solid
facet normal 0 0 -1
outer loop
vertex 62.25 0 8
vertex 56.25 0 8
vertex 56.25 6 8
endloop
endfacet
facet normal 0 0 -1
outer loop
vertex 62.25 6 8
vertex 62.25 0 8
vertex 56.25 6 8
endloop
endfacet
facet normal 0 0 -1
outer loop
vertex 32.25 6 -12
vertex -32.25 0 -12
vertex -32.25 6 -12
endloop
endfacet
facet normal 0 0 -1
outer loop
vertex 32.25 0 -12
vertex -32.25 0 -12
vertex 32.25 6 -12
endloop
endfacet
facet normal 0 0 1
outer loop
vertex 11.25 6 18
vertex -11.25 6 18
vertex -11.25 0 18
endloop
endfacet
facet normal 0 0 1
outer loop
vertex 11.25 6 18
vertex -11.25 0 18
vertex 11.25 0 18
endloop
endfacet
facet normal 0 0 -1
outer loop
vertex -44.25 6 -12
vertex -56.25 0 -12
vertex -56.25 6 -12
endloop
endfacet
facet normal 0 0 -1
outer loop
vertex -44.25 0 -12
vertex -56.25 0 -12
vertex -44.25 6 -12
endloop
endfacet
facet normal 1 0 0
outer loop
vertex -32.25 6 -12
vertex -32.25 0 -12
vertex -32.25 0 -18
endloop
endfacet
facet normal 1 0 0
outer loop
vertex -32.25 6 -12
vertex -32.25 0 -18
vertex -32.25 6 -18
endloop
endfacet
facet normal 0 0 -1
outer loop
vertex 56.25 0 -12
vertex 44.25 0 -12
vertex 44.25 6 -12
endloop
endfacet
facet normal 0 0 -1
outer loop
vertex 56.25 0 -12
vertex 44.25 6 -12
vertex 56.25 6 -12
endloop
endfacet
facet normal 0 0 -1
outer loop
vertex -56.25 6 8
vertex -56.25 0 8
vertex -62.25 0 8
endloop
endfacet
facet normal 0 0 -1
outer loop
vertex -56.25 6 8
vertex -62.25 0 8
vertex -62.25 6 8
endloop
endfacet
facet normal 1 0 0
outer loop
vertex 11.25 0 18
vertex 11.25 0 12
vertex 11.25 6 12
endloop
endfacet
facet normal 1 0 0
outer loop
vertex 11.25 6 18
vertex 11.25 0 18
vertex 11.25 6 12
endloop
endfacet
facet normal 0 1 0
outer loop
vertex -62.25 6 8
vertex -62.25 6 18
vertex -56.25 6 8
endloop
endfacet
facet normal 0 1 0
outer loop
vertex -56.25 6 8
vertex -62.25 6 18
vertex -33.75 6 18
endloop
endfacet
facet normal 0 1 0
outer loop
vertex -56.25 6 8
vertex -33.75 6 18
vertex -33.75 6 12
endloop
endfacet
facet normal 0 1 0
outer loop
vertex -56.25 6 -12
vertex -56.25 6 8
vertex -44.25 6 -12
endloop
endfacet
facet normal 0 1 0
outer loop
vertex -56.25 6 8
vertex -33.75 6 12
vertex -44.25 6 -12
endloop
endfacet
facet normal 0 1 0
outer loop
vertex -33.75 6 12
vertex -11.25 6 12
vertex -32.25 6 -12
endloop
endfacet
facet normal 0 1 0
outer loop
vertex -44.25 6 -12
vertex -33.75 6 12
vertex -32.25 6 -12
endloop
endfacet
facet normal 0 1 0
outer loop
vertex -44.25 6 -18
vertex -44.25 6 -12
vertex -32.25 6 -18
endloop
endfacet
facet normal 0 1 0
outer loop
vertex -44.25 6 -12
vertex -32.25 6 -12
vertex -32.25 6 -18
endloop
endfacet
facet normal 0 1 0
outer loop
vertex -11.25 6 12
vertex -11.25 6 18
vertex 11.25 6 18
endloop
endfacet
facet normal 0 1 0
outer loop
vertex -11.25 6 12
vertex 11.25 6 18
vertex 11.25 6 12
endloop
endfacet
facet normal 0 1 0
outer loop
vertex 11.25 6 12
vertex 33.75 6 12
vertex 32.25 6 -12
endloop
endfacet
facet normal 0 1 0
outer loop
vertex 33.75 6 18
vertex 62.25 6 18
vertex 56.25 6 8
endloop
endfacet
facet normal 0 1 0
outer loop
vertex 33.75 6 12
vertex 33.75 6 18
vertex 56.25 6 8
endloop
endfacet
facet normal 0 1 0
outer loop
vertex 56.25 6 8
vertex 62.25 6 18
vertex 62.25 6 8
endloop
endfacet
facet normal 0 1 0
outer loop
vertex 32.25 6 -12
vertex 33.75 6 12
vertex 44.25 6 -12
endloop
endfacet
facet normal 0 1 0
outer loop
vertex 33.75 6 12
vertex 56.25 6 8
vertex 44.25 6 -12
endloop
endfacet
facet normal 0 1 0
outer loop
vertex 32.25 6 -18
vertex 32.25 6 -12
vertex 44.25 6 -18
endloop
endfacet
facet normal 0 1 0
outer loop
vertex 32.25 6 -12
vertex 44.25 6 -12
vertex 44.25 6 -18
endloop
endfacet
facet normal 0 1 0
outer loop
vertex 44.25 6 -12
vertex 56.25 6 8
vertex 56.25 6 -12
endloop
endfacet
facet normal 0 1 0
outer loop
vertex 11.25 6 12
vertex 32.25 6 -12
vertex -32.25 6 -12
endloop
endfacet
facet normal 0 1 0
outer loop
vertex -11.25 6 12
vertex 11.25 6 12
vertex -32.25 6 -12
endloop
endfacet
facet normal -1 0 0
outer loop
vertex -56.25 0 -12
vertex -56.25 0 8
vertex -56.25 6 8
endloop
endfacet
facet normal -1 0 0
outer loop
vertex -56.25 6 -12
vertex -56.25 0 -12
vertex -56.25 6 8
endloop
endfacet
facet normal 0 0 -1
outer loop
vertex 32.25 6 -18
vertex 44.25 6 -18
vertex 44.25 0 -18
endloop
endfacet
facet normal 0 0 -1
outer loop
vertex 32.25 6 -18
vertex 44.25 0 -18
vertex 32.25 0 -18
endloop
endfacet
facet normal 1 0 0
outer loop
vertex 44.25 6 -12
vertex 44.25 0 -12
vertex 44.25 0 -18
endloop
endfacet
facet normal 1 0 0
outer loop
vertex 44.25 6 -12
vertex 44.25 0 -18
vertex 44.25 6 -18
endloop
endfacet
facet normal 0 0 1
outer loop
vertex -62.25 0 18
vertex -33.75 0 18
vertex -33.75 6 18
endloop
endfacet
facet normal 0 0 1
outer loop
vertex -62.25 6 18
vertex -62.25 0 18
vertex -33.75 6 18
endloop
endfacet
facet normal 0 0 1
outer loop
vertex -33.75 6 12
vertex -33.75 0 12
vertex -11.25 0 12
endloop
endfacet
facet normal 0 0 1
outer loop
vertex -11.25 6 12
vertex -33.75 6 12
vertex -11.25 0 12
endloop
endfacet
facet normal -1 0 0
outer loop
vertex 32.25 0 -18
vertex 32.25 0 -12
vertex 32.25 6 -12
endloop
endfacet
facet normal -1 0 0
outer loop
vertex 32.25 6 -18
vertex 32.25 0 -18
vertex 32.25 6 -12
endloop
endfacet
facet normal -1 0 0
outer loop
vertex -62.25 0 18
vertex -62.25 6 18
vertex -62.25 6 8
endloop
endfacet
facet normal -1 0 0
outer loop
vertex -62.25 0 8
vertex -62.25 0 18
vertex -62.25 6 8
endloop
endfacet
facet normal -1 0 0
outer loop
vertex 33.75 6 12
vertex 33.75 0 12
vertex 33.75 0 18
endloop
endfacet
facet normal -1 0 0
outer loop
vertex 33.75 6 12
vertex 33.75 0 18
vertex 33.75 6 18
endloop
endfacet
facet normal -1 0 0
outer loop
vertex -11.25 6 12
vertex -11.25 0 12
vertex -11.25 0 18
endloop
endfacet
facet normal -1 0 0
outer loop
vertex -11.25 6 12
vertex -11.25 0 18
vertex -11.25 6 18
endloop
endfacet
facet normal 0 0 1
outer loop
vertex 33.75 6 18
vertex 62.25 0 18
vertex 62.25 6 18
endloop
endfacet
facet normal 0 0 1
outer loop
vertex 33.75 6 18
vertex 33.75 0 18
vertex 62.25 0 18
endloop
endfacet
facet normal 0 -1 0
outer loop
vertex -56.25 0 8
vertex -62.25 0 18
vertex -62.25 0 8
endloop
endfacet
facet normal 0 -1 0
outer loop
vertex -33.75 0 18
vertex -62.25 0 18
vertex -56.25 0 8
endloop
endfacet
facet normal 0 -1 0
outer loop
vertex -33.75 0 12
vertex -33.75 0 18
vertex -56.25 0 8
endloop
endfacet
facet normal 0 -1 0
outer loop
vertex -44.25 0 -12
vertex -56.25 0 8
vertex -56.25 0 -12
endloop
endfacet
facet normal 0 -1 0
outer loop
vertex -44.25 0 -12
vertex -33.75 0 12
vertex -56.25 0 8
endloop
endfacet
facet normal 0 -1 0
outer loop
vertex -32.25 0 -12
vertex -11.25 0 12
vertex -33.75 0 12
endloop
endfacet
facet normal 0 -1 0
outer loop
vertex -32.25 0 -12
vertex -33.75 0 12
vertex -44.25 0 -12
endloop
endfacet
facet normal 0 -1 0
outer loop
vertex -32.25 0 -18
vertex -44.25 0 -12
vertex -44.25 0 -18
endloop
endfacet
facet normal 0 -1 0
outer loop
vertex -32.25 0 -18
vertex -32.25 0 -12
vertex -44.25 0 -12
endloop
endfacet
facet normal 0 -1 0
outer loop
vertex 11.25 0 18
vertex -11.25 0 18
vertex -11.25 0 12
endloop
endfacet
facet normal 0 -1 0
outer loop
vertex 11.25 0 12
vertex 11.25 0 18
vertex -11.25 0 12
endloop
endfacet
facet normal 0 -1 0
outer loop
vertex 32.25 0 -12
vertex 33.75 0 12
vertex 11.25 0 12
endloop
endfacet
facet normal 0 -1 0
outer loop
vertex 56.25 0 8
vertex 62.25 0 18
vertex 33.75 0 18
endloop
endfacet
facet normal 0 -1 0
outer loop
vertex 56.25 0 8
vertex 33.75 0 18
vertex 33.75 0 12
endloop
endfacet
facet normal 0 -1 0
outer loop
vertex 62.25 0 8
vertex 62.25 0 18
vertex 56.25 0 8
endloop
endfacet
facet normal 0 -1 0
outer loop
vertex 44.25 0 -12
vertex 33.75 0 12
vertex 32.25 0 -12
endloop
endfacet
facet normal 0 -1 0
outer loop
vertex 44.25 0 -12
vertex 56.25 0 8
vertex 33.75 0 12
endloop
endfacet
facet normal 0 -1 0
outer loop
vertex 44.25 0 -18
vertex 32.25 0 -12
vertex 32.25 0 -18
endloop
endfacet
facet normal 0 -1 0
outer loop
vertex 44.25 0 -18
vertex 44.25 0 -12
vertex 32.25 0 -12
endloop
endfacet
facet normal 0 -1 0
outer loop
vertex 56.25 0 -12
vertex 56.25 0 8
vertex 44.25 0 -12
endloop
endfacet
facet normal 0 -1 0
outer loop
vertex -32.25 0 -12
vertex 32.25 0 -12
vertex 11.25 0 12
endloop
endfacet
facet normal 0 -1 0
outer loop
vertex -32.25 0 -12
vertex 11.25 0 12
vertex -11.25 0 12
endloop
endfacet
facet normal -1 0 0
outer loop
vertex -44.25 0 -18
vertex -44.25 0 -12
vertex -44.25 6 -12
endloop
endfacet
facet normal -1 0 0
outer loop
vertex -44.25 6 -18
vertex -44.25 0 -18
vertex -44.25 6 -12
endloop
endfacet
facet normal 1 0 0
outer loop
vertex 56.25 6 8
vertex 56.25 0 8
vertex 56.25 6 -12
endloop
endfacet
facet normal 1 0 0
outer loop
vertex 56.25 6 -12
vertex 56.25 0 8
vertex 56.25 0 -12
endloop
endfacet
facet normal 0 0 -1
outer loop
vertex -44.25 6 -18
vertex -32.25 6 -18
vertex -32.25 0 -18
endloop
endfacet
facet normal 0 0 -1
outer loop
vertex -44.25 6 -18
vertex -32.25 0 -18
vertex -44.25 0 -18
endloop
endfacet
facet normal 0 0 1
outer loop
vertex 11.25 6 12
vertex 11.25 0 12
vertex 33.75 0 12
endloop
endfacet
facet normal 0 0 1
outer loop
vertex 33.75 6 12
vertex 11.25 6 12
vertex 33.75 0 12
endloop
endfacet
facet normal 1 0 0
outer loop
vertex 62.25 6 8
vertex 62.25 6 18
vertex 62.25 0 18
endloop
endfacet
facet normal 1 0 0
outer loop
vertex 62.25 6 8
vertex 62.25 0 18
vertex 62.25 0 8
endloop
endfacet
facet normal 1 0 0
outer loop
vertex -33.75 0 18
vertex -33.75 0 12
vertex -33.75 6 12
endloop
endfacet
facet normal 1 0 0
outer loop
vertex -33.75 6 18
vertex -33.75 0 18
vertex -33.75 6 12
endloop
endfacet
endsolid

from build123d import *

# Parameters (mm, degrees)
SKETCH1_W           = 112.5
SKETCH1_H           = 24
BOSS_EXTRUDE1_DEPTH = 6
SKETCH2_W           = 22.5
SKETCH2_H           = 6
BOSS_EXTRUDE2_DEPTH = 6
SKETCH3_W           = 10
SKETCH3_H           = 6
BOSS_EXTRUDE3_DEPTH = 6
SKETCH4_W           = 12
SKETCH4_H           = 6
BOSS_EXTRUDE4_DEPTH = 6


with BuildPart() as part:
    # Sketch1 → Boss-Extrude1 (new body)
    with BuildSketch(Plane(origin=(0, 0, 0), x_dir=(1, 0, 0), z_dir=(0, 1, 0))):
        Rectangle(SKETCH1_W, SKETCH1_H)
    extrude(amount=BOSS_EXTRUDE1_DEPTH)

    # Sketch2 → Boss-Extrude2 (add)
    with BuildSketch(Plane.XY.offset(12)):
        with Locations((-45, 3)):
            Rectangle(SKETCH2_W, SKETCH2_H)
        with Locations((0, 3)):
            Rectangle(SKETCH2_W, SKETCH2_H)
        with Locations((45, 3)):
            Rectangle(SKETCH2_W, SKETCH2_H)
    extrude(amount=BOSS_EXTRUDE2_DEPTH)

    # Sketch3 → Boss-Extrude3 (add)
    with BuildSketch(Plane(origin=(56.25, 0, 0), x_dir=(0, 0, -1), z_dir=(1, 0, 0))):
        with Locations((-13, 3)):
            Rectangle(SKETCH3_W, SKETCH3_H)
    boss_extrude3 = extrude(amount=BOSS_EXTRUDE3_DEPTH)

    # Mirror1: Boss-Extrude3 across plane
    add(boss_extrude3.mirror(Plane(origin=(0, 0, 0), x_dir=(0, 0, 1), z_dir=(1, 0, 0))))

    # Sketch4 → Boss-Extrude4 (add)
    with BuildSketch(Plane(origin=(0, 0, -12), x_dir=(-1, 0, 0), z_dir=(0, 0, -1))):
        with Locations((-38.25, 3)):
            Rectangle(SKETCH4_W, SKETCH4_H)
        with Locations((38.25, 3)):
            Rectangle(SKETCH4_W, SKETCH4_H)
    extrude(amount=BOSS_EXTRUDE4_DEPTH)


solid = part.part
